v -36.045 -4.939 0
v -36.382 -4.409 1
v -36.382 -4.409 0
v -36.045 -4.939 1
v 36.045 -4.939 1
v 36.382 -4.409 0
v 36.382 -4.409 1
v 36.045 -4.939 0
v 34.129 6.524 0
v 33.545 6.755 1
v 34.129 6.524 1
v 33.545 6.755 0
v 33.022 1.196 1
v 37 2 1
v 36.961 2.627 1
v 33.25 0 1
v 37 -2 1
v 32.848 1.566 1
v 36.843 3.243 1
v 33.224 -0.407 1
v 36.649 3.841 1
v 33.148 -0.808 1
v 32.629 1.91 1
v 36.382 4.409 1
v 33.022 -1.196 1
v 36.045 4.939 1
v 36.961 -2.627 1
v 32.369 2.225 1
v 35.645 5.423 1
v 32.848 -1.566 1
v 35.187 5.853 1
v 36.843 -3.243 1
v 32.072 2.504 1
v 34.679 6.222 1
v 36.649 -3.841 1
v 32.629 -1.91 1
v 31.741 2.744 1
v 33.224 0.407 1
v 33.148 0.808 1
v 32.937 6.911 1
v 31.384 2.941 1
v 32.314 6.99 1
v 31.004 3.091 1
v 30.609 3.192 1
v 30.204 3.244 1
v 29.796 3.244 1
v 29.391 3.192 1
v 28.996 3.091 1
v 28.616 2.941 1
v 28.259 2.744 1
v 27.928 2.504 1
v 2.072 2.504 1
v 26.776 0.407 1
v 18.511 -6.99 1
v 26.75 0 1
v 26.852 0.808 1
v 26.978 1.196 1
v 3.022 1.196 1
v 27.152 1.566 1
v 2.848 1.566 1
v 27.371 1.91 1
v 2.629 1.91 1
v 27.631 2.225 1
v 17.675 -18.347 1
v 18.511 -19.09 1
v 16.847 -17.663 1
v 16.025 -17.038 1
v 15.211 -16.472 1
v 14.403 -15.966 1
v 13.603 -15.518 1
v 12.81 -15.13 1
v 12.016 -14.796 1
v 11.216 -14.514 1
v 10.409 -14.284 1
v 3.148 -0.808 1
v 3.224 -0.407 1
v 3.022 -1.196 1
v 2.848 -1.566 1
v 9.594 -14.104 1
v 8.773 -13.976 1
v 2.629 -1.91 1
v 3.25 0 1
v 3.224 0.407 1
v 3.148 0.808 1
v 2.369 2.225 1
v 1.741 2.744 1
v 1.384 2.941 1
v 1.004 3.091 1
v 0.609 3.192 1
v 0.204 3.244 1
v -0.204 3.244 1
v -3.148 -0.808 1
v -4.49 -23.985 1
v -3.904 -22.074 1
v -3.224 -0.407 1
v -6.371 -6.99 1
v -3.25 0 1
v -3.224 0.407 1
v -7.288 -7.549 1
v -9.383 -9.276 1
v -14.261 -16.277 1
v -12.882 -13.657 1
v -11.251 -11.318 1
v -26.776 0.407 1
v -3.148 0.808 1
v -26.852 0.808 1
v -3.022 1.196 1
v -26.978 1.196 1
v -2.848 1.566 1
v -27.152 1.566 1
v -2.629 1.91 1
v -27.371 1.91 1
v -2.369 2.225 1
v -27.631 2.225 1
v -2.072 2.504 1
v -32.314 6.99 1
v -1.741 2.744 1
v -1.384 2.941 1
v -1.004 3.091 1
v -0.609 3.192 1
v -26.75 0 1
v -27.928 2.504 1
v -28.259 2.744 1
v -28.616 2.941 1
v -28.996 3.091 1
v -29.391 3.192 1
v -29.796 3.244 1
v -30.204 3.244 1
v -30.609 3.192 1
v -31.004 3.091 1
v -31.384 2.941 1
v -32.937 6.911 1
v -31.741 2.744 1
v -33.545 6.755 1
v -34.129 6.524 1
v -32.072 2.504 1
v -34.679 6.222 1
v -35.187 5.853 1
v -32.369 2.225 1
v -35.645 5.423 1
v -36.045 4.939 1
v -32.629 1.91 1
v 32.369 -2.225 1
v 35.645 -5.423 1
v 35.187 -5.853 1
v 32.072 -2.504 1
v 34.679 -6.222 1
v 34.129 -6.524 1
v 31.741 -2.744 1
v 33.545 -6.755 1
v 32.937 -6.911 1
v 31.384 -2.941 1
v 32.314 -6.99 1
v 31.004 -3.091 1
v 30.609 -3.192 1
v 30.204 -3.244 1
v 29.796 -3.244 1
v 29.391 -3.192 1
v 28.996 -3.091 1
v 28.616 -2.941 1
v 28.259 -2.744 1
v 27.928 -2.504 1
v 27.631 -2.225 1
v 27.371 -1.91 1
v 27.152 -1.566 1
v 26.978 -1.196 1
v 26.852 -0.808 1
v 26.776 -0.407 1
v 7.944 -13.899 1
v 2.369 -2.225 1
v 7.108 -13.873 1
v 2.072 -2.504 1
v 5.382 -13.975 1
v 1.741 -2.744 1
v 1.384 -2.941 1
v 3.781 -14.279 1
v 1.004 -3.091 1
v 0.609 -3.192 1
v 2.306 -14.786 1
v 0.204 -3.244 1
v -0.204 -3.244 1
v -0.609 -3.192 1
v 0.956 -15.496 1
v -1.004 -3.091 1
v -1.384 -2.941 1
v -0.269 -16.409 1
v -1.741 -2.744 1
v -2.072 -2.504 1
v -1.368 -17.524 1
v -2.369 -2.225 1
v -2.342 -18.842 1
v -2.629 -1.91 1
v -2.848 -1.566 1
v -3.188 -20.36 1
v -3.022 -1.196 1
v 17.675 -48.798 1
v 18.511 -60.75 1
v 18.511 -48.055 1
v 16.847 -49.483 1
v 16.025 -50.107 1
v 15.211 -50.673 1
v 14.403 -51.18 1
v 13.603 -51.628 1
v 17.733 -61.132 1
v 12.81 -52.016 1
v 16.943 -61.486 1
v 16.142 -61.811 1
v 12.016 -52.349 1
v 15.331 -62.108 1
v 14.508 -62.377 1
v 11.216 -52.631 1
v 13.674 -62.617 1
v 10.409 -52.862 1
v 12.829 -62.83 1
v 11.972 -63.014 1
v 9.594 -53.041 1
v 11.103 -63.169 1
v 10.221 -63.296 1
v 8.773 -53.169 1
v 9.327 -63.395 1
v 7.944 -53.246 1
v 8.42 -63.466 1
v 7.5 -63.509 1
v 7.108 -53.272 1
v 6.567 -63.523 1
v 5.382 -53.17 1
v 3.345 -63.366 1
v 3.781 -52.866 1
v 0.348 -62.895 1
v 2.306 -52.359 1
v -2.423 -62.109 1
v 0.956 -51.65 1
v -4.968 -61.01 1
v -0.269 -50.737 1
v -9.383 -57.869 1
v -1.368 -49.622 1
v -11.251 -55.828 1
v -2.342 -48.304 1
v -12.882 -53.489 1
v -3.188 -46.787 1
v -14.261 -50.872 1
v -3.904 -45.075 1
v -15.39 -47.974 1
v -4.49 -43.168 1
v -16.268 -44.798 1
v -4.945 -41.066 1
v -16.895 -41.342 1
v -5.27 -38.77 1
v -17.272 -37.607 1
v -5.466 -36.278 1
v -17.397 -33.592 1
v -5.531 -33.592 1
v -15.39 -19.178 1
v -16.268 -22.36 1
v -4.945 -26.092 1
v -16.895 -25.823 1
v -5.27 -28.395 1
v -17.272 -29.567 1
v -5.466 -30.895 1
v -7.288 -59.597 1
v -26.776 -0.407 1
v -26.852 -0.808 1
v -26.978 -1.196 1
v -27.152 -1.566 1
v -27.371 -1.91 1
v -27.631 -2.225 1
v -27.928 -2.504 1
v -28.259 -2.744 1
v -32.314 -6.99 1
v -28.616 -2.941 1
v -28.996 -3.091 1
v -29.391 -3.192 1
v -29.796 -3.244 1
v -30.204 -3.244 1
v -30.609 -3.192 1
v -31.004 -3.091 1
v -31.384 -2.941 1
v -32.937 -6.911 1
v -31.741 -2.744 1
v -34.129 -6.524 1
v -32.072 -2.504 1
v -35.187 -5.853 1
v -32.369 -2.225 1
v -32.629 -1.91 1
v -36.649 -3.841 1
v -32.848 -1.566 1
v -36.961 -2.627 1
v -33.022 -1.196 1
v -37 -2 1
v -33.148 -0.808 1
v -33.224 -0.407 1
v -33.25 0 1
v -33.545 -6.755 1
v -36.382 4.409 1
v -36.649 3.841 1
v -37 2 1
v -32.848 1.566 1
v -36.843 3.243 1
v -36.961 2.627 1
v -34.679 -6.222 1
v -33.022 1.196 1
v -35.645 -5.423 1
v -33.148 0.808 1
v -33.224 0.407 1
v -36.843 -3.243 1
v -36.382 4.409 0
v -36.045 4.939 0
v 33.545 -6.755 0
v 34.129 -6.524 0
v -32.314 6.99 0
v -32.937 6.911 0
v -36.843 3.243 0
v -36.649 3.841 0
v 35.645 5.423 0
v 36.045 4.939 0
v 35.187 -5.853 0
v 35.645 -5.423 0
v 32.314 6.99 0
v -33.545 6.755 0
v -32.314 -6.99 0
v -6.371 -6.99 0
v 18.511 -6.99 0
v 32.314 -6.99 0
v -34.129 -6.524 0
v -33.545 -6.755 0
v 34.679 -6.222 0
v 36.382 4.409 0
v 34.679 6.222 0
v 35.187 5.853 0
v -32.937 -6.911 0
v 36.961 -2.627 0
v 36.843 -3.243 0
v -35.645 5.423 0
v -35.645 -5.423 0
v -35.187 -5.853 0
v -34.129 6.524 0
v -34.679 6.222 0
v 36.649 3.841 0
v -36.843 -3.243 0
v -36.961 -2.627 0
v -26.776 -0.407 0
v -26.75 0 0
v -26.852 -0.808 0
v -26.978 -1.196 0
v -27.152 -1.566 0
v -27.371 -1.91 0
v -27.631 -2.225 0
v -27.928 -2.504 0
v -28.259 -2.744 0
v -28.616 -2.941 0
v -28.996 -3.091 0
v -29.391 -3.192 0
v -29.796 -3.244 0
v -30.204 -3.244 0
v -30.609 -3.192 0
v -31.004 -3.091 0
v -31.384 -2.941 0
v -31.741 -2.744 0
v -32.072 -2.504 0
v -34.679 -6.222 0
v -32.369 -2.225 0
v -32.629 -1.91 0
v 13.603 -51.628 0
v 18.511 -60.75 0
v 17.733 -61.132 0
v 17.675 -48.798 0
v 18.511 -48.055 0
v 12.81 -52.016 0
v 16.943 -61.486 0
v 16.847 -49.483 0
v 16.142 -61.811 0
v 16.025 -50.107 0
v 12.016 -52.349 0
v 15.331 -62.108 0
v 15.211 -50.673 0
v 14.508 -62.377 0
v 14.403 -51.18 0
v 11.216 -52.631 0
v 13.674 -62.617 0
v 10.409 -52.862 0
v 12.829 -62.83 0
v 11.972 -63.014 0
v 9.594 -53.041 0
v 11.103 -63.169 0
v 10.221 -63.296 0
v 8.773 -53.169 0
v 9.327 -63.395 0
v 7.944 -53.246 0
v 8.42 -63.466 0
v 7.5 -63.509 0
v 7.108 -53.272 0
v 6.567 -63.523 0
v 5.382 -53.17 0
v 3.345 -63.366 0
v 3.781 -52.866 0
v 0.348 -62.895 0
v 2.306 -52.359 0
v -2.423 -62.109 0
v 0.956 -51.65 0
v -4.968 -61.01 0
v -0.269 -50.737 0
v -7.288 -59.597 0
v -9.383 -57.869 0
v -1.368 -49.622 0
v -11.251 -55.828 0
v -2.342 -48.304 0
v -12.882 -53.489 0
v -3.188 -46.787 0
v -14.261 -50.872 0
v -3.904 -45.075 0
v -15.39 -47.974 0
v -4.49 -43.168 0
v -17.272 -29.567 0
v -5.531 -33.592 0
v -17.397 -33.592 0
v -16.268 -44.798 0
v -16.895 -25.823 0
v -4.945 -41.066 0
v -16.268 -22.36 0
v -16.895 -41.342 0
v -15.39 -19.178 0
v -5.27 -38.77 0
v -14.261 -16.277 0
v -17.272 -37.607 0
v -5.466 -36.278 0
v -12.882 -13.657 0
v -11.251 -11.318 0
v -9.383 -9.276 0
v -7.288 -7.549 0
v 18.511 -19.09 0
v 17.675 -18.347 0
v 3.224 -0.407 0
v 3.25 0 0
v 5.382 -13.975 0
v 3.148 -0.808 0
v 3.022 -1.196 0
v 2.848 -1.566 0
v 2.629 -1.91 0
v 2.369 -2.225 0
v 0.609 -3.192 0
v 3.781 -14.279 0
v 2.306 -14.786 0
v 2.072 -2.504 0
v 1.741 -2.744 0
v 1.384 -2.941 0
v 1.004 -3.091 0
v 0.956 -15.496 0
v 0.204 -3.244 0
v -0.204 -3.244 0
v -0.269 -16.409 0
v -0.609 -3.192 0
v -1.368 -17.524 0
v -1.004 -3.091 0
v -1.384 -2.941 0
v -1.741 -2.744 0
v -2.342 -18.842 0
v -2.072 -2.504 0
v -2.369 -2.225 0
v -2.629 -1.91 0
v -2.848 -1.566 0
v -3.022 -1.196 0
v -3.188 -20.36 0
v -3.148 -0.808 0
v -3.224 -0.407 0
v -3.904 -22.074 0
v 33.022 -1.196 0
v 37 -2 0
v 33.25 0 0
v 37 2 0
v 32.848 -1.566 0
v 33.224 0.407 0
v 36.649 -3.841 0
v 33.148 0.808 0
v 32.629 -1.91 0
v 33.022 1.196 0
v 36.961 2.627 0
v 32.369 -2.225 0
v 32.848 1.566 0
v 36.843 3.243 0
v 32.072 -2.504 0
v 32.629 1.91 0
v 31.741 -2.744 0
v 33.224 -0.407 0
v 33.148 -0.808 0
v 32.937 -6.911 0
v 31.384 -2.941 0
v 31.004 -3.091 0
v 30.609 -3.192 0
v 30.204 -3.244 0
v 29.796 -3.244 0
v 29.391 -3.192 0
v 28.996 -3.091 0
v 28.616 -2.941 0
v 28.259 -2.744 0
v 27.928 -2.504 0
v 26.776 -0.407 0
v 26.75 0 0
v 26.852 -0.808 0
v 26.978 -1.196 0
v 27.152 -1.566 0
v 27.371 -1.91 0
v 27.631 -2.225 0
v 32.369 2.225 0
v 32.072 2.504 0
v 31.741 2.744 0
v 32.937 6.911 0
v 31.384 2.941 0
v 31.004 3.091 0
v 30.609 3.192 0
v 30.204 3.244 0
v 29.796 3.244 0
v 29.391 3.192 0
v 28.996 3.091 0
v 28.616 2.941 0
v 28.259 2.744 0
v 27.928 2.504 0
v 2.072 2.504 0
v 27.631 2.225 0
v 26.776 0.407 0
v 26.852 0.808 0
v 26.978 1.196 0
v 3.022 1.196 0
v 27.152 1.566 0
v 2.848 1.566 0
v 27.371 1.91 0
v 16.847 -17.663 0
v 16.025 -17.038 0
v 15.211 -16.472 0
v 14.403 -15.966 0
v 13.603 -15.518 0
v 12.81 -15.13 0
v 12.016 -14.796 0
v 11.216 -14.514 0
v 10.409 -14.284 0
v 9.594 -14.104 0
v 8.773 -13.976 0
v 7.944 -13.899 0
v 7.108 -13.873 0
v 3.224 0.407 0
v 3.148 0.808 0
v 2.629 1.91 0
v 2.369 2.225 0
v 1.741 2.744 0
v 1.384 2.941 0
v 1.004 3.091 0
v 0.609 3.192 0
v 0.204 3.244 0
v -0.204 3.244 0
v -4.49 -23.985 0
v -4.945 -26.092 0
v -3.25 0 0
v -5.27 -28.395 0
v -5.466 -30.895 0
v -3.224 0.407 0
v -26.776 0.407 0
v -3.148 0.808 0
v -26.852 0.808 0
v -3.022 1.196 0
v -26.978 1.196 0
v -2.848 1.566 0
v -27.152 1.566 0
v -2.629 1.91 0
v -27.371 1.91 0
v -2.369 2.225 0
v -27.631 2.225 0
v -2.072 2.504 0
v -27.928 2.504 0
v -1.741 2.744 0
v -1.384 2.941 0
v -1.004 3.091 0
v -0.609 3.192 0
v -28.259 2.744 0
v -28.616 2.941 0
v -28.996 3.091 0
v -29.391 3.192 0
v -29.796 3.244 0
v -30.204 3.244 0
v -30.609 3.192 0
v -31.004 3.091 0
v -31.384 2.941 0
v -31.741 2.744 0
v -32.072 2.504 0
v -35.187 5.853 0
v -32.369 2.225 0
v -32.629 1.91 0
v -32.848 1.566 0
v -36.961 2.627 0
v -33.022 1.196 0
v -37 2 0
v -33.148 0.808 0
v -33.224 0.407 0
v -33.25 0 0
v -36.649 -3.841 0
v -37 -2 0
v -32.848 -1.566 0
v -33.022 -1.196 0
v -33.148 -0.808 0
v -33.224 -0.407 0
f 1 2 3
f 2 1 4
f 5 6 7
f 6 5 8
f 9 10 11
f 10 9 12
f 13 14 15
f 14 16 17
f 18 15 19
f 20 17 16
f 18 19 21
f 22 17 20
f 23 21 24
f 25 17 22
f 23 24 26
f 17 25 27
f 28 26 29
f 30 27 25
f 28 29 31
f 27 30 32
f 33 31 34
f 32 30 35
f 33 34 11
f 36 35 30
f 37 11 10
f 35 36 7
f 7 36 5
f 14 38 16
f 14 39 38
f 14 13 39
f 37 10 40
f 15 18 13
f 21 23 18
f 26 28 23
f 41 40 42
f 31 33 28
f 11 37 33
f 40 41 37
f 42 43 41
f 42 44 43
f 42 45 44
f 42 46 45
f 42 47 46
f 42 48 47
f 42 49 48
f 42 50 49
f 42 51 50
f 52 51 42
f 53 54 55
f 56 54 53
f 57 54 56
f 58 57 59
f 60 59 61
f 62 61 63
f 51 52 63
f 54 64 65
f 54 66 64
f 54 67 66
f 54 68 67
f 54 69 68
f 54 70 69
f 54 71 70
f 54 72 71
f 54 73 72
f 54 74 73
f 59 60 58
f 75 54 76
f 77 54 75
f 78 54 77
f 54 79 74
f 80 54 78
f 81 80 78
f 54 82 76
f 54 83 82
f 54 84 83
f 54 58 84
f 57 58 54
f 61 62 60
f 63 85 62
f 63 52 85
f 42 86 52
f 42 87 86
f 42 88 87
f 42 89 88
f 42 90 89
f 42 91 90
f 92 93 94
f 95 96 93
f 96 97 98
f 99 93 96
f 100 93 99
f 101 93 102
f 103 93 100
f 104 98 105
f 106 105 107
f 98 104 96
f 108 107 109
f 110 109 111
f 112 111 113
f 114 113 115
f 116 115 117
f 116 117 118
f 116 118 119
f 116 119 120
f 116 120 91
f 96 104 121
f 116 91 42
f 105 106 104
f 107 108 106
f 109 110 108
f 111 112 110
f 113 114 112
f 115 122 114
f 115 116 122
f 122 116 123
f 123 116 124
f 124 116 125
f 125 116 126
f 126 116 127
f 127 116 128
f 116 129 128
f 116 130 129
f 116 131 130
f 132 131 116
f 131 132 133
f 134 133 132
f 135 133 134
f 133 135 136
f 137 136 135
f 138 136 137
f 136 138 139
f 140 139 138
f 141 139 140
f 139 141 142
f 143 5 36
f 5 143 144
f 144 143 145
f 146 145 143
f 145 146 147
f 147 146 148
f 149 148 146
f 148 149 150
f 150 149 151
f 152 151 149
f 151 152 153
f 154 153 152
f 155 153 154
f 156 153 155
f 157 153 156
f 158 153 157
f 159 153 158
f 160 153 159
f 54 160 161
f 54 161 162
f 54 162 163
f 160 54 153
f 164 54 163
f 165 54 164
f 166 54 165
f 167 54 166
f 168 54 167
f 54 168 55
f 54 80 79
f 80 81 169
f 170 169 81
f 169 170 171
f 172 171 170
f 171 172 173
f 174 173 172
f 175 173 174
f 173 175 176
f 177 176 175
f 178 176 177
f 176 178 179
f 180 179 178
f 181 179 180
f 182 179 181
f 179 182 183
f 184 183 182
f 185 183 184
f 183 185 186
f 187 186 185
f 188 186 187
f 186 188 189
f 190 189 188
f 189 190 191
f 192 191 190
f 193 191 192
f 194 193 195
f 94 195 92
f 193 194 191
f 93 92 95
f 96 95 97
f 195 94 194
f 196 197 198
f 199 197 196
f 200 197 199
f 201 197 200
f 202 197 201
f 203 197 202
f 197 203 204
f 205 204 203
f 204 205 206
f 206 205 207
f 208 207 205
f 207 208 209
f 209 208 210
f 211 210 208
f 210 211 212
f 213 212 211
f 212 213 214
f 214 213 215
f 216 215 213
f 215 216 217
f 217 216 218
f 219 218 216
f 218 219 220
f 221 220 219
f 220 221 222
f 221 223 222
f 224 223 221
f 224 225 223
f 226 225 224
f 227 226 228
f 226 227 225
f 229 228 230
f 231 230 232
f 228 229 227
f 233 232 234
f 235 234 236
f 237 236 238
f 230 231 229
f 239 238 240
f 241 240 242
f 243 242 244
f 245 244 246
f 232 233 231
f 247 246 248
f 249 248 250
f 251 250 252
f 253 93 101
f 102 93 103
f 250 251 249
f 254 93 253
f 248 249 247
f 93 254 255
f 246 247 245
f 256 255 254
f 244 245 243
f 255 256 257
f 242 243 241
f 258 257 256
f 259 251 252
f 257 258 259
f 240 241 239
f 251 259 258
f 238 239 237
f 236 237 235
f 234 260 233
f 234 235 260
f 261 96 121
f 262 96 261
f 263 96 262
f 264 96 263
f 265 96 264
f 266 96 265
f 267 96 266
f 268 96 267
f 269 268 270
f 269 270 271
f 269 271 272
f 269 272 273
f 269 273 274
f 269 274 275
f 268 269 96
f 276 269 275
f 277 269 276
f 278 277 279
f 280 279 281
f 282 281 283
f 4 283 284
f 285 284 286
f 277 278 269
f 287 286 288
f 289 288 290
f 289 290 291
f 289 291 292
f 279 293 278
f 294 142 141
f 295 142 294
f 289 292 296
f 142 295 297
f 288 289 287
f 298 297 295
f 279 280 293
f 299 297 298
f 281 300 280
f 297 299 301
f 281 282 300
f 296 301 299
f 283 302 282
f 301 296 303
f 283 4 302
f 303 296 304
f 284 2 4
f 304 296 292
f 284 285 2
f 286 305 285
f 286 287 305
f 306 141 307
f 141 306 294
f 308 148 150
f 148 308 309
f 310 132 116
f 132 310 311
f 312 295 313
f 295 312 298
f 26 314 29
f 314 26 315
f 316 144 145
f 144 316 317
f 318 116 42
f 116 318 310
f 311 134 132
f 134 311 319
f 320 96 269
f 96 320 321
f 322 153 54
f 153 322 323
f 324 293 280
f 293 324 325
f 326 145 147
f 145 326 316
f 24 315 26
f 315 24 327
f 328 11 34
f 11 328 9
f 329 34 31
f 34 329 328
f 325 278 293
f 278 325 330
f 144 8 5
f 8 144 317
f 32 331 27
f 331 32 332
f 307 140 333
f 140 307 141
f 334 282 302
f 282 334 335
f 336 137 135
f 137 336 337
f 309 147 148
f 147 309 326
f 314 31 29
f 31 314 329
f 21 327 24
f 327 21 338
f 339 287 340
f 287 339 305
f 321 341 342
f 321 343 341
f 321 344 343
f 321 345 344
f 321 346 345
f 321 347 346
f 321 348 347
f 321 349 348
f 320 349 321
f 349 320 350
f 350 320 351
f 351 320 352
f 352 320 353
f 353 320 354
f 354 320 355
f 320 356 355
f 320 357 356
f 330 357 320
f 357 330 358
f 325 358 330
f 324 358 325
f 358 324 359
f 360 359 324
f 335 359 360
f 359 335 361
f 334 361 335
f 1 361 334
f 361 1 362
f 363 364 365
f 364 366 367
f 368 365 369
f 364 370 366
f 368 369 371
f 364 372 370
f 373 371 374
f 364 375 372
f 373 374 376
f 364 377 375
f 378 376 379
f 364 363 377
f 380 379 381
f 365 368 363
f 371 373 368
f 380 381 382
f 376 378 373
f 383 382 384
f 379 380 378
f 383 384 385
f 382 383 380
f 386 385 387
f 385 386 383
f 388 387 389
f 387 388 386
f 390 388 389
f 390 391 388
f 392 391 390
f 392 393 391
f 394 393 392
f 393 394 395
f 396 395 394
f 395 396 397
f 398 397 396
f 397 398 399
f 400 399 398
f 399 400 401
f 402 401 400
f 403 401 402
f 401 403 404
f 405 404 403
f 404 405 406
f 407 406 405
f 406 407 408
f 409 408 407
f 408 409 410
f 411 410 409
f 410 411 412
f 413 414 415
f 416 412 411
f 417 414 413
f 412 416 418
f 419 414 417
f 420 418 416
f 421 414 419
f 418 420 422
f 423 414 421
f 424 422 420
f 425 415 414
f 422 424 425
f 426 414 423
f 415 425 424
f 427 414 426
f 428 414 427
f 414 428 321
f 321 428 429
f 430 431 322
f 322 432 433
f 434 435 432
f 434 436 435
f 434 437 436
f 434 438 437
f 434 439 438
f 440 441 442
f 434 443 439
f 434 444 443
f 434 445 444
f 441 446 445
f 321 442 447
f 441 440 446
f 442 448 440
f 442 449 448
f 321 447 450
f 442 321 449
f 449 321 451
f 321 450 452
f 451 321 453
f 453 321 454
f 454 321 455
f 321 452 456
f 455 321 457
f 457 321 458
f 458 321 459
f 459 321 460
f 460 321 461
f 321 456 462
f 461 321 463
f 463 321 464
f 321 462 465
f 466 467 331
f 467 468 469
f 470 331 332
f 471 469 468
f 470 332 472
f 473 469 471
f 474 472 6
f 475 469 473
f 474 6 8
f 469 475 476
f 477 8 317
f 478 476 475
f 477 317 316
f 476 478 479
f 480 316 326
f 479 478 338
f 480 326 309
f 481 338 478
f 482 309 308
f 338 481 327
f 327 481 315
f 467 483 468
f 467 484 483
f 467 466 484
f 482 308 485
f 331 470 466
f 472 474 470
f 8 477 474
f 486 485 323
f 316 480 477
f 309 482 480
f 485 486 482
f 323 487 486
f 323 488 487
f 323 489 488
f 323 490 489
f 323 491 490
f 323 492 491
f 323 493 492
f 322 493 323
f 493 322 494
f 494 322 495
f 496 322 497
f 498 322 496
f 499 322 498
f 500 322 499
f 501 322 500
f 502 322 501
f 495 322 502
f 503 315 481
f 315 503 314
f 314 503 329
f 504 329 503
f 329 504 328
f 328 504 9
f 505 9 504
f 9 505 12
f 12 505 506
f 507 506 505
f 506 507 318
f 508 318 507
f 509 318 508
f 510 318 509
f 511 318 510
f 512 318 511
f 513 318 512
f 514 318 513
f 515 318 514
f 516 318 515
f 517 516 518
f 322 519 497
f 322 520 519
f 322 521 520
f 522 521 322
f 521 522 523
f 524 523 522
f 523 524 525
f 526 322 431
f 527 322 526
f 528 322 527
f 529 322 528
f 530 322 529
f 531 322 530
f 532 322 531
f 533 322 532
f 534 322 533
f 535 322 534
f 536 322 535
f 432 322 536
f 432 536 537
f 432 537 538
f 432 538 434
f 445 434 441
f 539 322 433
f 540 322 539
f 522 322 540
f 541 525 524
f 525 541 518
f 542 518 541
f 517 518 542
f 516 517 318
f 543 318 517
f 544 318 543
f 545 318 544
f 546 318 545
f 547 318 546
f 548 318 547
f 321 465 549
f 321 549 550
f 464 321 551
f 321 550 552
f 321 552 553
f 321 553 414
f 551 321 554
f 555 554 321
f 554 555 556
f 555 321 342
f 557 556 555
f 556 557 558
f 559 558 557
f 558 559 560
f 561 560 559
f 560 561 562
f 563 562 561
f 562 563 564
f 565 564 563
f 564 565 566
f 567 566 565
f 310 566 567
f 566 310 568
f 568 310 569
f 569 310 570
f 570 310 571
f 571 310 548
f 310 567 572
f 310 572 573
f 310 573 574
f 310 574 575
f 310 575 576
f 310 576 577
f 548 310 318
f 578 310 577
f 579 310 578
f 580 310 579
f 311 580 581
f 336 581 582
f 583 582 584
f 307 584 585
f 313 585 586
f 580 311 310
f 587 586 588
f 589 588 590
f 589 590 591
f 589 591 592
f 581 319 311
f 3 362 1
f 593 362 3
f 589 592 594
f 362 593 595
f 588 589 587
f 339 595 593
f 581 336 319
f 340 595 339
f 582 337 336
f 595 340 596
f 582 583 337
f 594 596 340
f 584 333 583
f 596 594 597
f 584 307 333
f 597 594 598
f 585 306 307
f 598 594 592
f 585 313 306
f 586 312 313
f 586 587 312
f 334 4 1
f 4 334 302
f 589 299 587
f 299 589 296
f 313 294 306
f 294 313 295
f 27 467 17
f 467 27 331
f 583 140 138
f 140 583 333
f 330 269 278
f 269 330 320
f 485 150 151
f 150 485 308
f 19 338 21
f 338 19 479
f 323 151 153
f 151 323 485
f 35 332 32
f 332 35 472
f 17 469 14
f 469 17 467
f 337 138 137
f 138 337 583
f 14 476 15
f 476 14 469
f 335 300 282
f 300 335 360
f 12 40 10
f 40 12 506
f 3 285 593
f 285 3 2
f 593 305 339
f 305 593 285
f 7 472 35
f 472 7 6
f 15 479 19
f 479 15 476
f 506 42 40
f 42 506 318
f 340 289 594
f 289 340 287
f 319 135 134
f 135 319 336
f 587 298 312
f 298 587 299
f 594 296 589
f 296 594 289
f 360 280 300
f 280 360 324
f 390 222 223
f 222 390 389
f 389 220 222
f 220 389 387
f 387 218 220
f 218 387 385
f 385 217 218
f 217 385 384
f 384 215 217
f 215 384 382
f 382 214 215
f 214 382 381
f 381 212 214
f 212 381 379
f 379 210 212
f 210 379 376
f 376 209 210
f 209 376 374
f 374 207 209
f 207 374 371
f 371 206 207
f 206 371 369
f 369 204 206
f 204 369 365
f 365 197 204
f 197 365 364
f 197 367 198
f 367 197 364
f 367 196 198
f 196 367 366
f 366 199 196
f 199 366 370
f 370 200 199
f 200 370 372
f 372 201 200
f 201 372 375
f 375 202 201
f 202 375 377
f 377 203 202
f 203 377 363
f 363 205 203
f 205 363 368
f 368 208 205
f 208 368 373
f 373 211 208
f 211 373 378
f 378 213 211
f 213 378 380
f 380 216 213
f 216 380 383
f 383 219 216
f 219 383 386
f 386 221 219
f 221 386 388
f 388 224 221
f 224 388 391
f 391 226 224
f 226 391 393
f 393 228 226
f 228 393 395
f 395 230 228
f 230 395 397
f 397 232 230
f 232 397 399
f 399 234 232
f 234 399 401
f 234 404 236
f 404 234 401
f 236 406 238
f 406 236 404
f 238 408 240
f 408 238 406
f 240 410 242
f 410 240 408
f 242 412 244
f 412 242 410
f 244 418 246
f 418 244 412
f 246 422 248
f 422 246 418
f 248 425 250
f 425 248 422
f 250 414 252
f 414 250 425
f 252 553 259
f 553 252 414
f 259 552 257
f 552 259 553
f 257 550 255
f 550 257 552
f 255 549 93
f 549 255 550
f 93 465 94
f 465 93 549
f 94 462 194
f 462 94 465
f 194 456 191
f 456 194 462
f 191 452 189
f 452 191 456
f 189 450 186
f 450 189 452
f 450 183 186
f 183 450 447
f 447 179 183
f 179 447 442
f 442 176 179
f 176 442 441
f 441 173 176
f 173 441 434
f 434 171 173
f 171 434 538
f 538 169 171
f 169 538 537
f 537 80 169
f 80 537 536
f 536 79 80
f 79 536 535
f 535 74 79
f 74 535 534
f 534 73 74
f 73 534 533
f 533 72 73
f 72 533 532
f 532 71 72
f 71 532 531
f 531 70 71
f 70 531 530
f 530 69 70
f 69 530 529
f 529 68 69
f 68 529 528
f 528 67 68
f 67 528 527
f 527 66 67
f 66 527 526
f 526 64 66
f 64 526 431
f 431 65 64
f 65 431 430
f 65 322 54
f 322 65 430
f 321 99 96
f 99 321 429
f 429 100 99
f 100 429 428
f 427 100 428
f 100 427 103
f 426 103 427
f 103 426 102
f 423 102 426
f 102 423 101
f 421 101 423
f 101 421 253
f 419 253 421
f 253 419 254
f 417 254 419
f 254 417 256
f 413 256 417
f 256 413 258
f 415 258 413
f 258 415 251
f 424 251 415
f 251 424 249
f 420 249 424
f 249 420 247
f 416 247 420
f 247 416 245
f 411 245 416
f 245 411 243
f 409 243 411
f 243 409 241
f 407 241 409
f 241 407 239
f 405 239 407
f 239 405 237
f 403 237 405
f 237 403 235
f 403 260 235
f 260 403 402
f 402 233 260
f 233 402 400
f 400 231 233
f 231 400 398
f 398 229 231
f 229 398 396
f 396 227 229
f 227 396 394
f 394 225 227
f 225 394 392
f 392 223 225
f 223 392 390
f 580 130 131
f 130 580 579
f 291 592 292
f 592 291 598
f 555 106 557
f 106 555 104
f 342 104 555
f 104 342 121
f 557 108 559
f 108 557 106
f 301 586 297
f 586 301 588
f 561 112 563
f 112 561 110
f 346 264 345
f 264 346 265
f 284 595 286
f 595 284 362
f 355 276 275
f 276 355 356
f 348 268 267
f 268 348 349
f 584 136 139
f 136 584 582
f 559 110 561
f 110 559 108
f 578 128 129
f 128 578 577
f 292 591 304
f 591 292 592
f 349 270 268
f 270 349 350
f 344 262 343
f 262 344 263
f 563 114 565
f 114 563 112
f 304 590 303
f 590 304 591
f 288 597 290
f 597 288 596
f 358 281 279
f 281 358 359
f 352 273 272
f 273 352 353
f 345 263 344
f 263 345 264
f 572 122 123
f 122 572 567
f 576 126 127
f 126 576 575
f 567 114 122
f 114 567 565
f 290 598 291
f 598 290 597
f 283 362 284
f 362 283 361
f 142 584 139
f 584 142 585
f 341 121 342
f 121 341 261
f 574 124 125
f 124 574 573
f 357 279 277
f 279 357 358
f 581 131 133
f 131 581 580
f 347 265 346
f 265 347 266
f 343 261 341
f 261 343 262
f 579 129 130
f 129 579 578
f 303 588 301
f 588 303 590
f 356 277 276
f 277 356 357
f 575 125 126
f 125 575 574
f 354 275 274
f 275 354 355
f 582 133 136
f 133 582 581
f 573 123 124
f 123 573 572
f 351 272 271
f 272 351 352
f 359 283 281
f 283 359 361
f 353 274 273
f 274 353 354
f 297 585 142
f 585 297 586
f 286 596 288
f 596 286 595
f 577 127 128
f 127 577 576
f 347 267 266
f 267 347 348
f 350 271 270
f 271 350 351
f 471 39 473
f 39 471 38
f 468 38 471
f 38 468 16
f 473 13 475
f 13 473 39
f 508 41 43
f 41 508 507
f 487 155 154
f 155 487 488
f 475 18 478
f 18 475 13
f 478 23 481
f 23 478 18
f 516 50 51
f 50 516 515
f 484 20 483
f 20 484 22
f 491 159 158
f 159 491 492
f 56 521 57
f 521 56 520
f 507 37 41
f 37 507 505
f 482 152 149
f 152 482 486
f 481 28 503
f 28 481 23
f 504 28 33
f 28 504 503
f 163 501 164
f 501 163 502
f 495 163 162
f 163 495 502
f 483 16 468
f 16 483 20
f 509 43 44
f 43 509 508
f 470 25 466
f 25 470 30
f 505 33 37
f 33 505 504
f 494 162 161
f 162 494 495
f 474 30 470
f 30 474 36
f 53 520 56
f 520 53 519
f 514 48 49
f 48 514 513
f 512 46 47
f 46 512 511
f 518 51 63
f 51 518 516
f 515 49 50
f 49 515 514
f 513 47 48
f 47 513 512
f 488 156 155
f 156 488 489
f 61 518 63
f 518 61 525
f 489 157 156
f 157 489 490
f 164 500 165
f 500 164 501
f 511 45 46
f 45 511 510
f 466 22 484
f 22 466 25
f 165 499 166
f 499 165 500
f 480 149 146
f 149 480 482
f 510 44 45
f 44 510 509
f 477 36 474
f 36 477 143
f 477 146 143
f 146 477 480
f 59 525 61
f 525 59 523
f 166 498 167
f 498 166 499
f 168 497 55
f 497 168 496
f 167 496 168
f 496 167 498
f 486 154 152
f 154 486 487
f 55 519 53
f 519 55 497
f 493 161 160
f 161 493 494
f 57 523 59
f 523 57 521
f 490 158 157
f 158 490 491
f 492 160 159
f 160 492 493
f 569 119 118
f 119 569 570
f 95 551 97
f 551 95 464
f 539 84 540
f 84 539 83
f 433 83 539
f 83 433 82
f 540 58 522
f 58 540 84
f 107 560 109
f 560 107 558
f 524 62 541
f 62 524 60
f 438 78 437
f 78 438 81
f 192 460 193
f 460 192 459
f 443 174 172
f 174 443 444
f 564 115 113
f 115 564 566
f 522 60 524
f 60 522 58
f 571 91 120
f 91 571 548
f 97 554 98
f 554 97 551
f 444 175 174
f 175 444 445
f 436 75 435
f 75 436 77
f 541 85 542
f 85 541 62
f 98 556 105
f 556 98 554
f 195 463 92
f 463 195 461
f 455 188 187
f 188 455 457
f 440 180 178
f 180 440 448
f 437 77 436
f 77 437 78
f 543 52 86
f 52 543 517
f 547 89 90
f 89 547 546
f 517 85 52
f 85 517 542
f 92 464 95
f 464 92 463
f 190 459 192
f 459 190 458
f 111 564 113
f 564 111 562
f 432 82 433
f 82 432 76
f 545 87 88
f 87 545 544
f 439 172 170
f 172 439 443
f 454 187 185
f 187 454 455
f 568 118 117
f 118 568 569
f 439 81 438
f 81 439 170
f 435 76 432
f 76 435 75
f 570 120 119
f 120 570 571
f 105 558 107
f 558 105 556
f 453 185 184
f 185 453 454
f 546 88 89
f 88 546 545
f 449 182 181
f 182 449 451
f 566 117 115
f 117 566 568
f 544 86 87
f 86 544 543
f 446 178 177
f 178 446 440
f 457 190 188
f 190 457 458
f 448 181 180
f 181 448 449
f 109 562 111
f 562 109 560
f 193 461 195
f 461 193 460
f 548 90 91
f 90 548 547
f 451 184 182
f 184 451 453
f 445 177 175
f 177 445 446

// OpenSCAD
$fn = 50;


difference() {
	union() {
		translate(v = [0, 0, 0]) {
			rotate(a = [0, 0, 0]) {
				hull() {
					translate(v = [-32.0000000000, 2.0000000000, 0]) {
						rotate(a = [0, 0, 0]) {
							translate(v = [0, 0, 0]) {
								rotate(a = [0, 0, 0]) {
									cylinder(h = 1, r = 5);
								}
							}
						}
					}
					translate(v = [32.0000000000, 2.0000000000, 0]) {
						rotate(a = [0, 0, 0]) {
							translate(v = [0, 0, 0]) {
								rotate(a = [0, 0, 0]) {
									cylinder(h = 1, r = 5);
								}
							}
						}
					}
					translate(v = [-32.0000000000, -2.0000000000, 0]) {
						rotate(a = [0, 0, 0]) {
							translate(v = [0, 0, 0]) {
								rotate(a = [0, 0, 0]) {
									cylinder(h = 1, r = 5);
								}
							}
						}
					}
					translate(v = [32.0000000000, -2.0000000000, 0]) {
						rotate(a = [0, 0, 0]) {
							translate(v = [0, 0, 0]) {
								rotate(a = [0, 0, 0]) {
									cylinder(h = 1, r = 5);
								}
							}
						}
					}
				}
			}
		}
		translate(v = [0, -5, 0]) {
			rotate(a = [0, 0, 0]) {
				linear_extrude(height = 1) {
					text(font = "DejaVu Sans Mono:style=Bold", halign = "center", size = 57.0000000000, text = "C", valign = "top");
				}
			}
		}
	}
	union() {
		translate(v = [-30.0000000000, 0.0000000000, -125.0000000000]) {
			rotate(a = [0, 0, 0]) {
				cylinder(h = 250, r = 3.2500000000);
			}
		}
		translate(v = [30.0000000000, 0.0000000000, -125.0000000000]) {
			rotate(a = [0, 0, 0]) {
				cylinder(h = 250, r = 3.2500000000);
			}
		}
		translate(v = [30.0000000000, 0.0000000000, -125.0000000000]) {
			rotate(a = [0, 0, 0]) {
				cylinder(h = 250, r = 3.2500000000);
			}
		}
		translate(v = [0, 0, -125.0000000000]) {
			rotate(a = [0, 0, 0]) {
				cylinder(h = 250, r = 3.2500000000);
			}
		}
	}
}
